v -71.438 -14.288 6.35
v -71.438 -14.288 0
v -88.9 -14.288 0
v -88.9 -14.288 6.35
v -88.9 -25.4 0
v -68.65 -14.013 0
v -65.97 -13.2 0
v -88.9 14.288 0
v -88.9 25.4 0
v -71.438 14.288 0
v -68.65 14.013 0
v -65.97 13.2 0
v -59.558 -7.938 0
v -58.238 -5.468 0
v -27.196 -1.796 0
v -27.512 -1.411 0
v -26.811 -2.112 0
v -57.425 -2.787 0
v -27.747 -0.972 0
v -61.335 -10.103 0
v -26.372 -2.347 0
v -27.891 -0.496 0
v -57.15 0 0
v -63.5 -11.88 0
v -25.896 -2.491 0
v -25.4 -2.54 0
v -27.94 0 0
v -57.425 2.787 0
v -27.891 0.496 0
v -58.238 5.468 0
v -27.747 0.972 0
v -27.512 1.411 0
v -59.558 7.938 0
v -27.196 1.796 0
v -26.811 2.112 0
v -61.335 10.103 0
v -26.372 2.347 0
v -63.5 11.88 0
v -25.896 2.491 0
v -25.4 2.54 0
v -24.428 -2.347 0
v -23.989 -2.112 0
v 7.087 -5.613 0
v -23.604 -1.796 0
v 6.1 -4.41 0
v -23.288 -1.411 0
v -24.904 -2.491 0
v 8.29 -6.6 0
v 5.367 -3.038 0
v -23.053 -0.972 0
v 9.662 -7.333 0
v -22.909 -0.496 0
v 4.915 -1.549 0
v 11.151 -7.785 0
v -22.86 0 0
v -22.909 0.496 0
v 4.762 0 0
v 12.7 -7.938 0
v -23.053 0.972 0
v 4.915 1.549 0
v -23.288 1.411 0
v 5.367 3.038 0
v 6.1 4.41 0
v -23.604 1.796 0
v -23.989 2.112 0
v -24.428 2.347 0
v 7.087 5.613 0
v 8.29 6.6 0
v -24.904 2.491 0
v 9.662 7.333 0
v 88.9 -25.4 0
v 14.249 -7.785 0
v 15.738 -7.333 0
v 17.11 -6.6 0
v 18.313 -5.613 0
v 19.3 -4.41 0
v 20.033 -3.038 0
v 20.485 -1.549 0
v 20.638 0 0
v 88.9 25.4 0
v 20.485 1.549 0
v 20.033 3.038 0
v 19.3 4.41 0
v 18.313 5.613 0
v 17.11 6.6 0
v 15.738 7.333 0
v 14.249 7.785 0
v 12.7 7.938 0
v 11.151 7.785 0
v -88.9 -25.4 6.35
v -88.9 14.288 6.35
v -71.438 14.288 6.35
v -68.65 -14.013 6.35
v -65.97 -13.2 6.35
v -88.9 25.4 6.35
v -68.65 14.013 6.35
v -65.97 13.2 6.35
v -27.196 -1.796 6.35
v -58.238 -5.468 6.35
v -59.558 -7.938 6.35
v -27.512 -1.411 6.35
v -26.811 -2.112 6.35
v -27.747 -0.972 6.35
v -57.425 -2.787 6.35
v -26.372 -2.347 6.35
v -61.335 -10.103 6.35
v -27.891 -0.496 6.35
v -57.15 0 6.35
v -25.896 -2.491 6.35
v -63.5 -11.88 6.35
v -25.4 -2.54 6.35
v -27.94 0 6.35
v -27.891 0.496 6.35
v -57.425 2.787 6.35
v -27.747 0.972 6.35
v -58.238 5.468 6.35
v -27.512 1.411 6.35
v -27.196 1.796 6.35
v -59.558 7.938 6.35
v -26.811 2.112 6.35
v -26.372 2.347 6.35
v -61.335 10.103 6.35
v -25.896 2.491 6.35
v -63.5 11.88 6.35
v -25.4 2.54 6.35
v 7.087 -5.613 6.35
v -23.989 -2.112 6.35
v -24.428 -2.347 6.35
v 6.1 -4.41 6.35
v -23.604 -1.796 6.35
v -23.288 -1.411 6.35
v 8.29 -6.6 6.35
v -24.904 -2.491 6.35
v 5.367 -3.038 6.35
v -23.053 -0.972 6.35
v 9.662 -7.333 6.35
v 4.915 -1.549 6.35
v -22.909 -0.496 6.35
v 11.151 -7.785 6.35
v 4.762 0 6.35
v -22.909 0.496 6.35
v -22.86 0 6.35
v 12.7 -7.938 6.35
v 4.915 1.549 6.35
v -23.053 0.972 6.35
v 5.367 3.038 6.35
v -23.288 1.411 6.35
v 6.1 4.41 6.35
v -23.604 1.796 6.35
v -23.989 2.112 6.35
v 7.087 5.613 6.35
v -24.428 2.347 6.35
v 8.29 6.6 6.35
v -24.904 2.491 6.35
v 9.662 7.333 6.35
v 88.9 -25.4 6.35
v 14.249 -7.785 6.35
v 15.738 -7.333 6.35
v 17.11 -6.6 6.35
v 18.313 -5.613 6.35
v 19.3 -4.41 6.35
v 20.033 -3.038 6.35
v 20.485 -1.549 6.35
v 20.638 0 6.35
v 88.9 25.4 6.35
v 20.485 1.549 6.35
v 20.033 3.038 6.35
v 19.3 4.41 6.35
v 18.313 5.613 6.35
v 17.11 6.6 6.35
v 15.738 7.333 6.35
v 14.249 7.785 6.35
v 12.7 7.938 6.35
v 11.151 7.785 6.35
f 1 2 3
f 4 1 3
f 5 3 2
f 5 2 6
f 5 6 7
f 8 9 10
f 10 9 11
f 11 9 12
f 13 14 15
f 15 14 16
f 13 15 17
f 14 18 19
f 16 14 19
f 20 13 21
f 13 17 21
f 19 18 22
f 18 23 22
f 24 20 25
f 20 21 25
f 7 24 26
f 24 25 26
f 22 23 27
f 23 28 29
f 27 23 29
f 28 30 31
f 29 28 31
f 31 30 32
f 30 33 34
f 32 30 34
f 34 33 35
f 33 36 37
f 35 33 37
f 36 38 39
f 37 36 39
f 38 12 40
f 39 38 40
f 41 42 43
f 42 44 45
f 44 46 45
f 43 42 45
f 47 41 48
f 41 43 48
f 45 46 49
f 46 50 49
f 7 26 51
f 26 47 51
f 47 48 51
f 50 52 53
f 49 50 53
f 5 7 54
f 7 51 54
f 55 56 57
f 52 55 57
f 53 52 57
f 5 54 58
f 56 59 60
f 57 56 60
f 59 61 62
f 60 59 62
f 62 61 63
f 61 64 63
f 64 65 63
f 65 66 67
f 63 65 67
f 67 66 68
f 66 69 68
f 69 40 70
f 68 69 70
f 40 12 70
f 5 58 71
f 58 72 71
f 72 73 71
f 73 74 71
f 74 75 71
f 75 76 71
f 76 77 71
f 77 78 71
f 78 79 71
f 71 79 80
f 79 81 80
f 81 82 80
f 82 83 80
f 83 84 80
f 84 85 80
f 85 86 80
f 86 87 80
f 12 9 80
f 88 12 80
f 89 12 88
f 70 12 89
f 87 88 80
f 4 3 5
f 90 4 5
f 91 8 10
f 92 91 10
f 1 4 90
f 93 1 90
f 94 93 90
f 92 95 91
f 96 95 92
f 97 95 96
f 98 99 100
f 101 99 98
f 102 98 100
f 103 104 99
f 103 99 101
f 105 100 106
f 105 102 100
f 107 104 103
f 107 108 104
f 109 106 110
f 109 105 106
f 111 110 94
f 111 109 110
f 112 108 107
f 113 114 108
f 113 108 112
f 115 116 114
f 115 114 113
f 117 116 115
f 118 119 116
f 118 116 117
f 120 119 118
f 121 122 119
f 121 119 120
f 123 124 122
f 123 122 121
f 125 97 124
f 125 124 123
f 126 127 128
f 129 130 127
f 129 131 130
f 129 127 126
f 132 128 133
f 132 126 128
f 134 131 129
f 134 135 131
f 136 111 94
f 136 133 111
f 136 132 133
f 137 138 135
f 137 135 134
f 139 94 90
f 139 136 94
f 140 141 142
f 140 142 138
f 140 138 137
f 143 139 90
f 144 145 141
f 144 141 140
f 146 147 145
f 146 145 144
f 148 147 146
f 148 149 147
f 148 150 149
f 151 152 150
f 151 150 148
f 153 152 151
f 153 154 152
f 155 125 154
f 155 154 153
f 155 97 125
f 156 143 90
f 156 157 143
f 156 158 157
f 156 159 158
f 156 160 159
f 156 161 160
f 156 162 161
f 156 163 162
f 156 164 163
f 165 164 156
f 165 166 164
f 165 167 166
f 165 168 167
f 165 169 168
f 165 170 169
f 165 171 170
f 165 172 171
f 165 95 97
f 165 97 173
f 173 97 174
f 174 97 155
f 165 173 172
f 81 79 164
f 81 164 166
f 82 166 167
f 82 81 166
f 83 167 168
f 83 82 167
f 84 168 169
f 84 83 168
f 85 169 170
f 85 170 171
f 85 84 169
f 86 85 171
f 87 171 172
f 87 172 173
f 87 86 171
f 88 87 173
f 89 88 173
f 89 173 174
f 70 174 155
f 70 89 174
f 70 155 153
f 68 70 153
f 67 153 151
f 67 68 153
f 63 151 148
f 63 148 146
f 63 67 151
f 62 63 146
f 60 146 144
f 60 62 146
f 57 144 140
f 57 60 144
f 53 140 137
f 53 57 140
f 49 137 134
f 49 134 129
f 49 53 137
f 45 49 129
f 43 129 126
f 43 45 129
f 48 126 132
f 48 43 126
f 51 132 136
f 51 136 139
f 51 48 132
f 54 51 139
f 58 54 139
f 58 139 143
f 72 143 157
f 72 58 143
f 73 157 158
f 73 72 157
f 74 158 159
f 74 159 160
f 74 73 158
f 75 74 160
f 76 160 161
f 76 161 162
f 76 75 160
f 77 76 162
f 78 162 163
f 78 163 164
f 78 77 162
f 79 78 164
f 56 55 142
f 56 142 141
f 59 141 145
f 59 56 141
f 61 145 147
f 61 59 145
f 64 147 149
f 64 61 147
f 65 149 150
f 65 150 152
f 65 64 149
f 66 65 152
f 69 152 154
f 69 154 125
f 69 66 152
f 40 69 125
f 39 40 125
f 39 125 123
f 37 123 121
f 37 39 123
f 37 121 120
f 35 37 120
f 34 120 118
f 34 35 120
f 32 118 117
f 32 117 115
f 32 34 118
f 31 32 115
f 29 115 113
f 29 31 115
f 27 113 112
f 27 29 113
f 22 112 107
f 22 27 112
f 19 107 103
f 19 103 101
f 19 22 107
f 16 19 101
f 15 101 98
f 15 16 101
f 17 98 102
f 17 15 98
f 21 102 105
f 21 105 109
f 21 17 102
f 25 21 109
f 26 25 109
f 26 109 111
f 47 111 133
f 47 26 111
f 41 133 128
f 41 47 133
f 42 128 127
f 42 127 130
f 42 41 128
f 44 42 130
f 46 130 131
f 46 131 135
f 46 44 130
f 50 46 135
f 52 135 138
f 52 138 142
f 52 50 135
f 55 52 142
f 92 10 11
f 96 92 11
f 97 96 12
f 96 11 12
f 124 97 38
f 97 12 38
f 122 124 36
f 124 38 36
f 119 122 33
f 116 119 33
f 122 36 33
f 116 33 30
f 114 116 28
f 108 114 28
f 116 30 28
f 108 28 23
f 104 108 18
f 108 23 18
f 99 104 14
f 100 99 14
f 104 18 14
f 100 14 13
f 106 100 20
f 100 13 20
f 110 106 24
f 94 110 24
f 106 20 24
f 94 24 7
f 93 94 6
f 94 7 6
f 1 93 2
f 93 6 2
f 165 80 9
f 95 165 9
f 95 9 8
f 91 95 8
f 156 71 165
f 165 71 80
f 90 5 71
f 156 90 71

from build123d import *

# Parameters (mm, degrees)
F0_R     = 2.54
F0_R_2   = 7.9375
F1_DEPTH = 6.35


with BuildPart() as f1:
    # F0 (on Top) → F1 (new body)
    with BuildSketch(Plane.XY):
        with BuildLine():
            Line((88.9, -25.4), (88.9, 25.4))
            Line((88.9, 25.4), (-88.9, 25.4))
            Line((-88.9, 25.4), (-88.9, 14.2875))
            Line((-88.9, 14.2875), (-71.4375, 14.2875))
            ThreePointArc((-71.4375, 14.2875), (-57.15, 0), (-71.4375, -14.2875))
            Line((-71.4375, -14.2875), (-88.9, -14.2875))
            Line((-88.9, -14.2875), (-88.9, -25.4))
            Line((-88.9, -25.4), (88.9, -25.4))
        make_face()
        with Locations((-25.4, 0)):
            Circle(F0_R, mode=Mode.SUBTRACT)
        with Locations((12.7, 0)):
            Circle(F0_R_2, mode=Mode.SUBTRACT)
    extrude(amount=F1_DEPTH)


solid = f1.part
